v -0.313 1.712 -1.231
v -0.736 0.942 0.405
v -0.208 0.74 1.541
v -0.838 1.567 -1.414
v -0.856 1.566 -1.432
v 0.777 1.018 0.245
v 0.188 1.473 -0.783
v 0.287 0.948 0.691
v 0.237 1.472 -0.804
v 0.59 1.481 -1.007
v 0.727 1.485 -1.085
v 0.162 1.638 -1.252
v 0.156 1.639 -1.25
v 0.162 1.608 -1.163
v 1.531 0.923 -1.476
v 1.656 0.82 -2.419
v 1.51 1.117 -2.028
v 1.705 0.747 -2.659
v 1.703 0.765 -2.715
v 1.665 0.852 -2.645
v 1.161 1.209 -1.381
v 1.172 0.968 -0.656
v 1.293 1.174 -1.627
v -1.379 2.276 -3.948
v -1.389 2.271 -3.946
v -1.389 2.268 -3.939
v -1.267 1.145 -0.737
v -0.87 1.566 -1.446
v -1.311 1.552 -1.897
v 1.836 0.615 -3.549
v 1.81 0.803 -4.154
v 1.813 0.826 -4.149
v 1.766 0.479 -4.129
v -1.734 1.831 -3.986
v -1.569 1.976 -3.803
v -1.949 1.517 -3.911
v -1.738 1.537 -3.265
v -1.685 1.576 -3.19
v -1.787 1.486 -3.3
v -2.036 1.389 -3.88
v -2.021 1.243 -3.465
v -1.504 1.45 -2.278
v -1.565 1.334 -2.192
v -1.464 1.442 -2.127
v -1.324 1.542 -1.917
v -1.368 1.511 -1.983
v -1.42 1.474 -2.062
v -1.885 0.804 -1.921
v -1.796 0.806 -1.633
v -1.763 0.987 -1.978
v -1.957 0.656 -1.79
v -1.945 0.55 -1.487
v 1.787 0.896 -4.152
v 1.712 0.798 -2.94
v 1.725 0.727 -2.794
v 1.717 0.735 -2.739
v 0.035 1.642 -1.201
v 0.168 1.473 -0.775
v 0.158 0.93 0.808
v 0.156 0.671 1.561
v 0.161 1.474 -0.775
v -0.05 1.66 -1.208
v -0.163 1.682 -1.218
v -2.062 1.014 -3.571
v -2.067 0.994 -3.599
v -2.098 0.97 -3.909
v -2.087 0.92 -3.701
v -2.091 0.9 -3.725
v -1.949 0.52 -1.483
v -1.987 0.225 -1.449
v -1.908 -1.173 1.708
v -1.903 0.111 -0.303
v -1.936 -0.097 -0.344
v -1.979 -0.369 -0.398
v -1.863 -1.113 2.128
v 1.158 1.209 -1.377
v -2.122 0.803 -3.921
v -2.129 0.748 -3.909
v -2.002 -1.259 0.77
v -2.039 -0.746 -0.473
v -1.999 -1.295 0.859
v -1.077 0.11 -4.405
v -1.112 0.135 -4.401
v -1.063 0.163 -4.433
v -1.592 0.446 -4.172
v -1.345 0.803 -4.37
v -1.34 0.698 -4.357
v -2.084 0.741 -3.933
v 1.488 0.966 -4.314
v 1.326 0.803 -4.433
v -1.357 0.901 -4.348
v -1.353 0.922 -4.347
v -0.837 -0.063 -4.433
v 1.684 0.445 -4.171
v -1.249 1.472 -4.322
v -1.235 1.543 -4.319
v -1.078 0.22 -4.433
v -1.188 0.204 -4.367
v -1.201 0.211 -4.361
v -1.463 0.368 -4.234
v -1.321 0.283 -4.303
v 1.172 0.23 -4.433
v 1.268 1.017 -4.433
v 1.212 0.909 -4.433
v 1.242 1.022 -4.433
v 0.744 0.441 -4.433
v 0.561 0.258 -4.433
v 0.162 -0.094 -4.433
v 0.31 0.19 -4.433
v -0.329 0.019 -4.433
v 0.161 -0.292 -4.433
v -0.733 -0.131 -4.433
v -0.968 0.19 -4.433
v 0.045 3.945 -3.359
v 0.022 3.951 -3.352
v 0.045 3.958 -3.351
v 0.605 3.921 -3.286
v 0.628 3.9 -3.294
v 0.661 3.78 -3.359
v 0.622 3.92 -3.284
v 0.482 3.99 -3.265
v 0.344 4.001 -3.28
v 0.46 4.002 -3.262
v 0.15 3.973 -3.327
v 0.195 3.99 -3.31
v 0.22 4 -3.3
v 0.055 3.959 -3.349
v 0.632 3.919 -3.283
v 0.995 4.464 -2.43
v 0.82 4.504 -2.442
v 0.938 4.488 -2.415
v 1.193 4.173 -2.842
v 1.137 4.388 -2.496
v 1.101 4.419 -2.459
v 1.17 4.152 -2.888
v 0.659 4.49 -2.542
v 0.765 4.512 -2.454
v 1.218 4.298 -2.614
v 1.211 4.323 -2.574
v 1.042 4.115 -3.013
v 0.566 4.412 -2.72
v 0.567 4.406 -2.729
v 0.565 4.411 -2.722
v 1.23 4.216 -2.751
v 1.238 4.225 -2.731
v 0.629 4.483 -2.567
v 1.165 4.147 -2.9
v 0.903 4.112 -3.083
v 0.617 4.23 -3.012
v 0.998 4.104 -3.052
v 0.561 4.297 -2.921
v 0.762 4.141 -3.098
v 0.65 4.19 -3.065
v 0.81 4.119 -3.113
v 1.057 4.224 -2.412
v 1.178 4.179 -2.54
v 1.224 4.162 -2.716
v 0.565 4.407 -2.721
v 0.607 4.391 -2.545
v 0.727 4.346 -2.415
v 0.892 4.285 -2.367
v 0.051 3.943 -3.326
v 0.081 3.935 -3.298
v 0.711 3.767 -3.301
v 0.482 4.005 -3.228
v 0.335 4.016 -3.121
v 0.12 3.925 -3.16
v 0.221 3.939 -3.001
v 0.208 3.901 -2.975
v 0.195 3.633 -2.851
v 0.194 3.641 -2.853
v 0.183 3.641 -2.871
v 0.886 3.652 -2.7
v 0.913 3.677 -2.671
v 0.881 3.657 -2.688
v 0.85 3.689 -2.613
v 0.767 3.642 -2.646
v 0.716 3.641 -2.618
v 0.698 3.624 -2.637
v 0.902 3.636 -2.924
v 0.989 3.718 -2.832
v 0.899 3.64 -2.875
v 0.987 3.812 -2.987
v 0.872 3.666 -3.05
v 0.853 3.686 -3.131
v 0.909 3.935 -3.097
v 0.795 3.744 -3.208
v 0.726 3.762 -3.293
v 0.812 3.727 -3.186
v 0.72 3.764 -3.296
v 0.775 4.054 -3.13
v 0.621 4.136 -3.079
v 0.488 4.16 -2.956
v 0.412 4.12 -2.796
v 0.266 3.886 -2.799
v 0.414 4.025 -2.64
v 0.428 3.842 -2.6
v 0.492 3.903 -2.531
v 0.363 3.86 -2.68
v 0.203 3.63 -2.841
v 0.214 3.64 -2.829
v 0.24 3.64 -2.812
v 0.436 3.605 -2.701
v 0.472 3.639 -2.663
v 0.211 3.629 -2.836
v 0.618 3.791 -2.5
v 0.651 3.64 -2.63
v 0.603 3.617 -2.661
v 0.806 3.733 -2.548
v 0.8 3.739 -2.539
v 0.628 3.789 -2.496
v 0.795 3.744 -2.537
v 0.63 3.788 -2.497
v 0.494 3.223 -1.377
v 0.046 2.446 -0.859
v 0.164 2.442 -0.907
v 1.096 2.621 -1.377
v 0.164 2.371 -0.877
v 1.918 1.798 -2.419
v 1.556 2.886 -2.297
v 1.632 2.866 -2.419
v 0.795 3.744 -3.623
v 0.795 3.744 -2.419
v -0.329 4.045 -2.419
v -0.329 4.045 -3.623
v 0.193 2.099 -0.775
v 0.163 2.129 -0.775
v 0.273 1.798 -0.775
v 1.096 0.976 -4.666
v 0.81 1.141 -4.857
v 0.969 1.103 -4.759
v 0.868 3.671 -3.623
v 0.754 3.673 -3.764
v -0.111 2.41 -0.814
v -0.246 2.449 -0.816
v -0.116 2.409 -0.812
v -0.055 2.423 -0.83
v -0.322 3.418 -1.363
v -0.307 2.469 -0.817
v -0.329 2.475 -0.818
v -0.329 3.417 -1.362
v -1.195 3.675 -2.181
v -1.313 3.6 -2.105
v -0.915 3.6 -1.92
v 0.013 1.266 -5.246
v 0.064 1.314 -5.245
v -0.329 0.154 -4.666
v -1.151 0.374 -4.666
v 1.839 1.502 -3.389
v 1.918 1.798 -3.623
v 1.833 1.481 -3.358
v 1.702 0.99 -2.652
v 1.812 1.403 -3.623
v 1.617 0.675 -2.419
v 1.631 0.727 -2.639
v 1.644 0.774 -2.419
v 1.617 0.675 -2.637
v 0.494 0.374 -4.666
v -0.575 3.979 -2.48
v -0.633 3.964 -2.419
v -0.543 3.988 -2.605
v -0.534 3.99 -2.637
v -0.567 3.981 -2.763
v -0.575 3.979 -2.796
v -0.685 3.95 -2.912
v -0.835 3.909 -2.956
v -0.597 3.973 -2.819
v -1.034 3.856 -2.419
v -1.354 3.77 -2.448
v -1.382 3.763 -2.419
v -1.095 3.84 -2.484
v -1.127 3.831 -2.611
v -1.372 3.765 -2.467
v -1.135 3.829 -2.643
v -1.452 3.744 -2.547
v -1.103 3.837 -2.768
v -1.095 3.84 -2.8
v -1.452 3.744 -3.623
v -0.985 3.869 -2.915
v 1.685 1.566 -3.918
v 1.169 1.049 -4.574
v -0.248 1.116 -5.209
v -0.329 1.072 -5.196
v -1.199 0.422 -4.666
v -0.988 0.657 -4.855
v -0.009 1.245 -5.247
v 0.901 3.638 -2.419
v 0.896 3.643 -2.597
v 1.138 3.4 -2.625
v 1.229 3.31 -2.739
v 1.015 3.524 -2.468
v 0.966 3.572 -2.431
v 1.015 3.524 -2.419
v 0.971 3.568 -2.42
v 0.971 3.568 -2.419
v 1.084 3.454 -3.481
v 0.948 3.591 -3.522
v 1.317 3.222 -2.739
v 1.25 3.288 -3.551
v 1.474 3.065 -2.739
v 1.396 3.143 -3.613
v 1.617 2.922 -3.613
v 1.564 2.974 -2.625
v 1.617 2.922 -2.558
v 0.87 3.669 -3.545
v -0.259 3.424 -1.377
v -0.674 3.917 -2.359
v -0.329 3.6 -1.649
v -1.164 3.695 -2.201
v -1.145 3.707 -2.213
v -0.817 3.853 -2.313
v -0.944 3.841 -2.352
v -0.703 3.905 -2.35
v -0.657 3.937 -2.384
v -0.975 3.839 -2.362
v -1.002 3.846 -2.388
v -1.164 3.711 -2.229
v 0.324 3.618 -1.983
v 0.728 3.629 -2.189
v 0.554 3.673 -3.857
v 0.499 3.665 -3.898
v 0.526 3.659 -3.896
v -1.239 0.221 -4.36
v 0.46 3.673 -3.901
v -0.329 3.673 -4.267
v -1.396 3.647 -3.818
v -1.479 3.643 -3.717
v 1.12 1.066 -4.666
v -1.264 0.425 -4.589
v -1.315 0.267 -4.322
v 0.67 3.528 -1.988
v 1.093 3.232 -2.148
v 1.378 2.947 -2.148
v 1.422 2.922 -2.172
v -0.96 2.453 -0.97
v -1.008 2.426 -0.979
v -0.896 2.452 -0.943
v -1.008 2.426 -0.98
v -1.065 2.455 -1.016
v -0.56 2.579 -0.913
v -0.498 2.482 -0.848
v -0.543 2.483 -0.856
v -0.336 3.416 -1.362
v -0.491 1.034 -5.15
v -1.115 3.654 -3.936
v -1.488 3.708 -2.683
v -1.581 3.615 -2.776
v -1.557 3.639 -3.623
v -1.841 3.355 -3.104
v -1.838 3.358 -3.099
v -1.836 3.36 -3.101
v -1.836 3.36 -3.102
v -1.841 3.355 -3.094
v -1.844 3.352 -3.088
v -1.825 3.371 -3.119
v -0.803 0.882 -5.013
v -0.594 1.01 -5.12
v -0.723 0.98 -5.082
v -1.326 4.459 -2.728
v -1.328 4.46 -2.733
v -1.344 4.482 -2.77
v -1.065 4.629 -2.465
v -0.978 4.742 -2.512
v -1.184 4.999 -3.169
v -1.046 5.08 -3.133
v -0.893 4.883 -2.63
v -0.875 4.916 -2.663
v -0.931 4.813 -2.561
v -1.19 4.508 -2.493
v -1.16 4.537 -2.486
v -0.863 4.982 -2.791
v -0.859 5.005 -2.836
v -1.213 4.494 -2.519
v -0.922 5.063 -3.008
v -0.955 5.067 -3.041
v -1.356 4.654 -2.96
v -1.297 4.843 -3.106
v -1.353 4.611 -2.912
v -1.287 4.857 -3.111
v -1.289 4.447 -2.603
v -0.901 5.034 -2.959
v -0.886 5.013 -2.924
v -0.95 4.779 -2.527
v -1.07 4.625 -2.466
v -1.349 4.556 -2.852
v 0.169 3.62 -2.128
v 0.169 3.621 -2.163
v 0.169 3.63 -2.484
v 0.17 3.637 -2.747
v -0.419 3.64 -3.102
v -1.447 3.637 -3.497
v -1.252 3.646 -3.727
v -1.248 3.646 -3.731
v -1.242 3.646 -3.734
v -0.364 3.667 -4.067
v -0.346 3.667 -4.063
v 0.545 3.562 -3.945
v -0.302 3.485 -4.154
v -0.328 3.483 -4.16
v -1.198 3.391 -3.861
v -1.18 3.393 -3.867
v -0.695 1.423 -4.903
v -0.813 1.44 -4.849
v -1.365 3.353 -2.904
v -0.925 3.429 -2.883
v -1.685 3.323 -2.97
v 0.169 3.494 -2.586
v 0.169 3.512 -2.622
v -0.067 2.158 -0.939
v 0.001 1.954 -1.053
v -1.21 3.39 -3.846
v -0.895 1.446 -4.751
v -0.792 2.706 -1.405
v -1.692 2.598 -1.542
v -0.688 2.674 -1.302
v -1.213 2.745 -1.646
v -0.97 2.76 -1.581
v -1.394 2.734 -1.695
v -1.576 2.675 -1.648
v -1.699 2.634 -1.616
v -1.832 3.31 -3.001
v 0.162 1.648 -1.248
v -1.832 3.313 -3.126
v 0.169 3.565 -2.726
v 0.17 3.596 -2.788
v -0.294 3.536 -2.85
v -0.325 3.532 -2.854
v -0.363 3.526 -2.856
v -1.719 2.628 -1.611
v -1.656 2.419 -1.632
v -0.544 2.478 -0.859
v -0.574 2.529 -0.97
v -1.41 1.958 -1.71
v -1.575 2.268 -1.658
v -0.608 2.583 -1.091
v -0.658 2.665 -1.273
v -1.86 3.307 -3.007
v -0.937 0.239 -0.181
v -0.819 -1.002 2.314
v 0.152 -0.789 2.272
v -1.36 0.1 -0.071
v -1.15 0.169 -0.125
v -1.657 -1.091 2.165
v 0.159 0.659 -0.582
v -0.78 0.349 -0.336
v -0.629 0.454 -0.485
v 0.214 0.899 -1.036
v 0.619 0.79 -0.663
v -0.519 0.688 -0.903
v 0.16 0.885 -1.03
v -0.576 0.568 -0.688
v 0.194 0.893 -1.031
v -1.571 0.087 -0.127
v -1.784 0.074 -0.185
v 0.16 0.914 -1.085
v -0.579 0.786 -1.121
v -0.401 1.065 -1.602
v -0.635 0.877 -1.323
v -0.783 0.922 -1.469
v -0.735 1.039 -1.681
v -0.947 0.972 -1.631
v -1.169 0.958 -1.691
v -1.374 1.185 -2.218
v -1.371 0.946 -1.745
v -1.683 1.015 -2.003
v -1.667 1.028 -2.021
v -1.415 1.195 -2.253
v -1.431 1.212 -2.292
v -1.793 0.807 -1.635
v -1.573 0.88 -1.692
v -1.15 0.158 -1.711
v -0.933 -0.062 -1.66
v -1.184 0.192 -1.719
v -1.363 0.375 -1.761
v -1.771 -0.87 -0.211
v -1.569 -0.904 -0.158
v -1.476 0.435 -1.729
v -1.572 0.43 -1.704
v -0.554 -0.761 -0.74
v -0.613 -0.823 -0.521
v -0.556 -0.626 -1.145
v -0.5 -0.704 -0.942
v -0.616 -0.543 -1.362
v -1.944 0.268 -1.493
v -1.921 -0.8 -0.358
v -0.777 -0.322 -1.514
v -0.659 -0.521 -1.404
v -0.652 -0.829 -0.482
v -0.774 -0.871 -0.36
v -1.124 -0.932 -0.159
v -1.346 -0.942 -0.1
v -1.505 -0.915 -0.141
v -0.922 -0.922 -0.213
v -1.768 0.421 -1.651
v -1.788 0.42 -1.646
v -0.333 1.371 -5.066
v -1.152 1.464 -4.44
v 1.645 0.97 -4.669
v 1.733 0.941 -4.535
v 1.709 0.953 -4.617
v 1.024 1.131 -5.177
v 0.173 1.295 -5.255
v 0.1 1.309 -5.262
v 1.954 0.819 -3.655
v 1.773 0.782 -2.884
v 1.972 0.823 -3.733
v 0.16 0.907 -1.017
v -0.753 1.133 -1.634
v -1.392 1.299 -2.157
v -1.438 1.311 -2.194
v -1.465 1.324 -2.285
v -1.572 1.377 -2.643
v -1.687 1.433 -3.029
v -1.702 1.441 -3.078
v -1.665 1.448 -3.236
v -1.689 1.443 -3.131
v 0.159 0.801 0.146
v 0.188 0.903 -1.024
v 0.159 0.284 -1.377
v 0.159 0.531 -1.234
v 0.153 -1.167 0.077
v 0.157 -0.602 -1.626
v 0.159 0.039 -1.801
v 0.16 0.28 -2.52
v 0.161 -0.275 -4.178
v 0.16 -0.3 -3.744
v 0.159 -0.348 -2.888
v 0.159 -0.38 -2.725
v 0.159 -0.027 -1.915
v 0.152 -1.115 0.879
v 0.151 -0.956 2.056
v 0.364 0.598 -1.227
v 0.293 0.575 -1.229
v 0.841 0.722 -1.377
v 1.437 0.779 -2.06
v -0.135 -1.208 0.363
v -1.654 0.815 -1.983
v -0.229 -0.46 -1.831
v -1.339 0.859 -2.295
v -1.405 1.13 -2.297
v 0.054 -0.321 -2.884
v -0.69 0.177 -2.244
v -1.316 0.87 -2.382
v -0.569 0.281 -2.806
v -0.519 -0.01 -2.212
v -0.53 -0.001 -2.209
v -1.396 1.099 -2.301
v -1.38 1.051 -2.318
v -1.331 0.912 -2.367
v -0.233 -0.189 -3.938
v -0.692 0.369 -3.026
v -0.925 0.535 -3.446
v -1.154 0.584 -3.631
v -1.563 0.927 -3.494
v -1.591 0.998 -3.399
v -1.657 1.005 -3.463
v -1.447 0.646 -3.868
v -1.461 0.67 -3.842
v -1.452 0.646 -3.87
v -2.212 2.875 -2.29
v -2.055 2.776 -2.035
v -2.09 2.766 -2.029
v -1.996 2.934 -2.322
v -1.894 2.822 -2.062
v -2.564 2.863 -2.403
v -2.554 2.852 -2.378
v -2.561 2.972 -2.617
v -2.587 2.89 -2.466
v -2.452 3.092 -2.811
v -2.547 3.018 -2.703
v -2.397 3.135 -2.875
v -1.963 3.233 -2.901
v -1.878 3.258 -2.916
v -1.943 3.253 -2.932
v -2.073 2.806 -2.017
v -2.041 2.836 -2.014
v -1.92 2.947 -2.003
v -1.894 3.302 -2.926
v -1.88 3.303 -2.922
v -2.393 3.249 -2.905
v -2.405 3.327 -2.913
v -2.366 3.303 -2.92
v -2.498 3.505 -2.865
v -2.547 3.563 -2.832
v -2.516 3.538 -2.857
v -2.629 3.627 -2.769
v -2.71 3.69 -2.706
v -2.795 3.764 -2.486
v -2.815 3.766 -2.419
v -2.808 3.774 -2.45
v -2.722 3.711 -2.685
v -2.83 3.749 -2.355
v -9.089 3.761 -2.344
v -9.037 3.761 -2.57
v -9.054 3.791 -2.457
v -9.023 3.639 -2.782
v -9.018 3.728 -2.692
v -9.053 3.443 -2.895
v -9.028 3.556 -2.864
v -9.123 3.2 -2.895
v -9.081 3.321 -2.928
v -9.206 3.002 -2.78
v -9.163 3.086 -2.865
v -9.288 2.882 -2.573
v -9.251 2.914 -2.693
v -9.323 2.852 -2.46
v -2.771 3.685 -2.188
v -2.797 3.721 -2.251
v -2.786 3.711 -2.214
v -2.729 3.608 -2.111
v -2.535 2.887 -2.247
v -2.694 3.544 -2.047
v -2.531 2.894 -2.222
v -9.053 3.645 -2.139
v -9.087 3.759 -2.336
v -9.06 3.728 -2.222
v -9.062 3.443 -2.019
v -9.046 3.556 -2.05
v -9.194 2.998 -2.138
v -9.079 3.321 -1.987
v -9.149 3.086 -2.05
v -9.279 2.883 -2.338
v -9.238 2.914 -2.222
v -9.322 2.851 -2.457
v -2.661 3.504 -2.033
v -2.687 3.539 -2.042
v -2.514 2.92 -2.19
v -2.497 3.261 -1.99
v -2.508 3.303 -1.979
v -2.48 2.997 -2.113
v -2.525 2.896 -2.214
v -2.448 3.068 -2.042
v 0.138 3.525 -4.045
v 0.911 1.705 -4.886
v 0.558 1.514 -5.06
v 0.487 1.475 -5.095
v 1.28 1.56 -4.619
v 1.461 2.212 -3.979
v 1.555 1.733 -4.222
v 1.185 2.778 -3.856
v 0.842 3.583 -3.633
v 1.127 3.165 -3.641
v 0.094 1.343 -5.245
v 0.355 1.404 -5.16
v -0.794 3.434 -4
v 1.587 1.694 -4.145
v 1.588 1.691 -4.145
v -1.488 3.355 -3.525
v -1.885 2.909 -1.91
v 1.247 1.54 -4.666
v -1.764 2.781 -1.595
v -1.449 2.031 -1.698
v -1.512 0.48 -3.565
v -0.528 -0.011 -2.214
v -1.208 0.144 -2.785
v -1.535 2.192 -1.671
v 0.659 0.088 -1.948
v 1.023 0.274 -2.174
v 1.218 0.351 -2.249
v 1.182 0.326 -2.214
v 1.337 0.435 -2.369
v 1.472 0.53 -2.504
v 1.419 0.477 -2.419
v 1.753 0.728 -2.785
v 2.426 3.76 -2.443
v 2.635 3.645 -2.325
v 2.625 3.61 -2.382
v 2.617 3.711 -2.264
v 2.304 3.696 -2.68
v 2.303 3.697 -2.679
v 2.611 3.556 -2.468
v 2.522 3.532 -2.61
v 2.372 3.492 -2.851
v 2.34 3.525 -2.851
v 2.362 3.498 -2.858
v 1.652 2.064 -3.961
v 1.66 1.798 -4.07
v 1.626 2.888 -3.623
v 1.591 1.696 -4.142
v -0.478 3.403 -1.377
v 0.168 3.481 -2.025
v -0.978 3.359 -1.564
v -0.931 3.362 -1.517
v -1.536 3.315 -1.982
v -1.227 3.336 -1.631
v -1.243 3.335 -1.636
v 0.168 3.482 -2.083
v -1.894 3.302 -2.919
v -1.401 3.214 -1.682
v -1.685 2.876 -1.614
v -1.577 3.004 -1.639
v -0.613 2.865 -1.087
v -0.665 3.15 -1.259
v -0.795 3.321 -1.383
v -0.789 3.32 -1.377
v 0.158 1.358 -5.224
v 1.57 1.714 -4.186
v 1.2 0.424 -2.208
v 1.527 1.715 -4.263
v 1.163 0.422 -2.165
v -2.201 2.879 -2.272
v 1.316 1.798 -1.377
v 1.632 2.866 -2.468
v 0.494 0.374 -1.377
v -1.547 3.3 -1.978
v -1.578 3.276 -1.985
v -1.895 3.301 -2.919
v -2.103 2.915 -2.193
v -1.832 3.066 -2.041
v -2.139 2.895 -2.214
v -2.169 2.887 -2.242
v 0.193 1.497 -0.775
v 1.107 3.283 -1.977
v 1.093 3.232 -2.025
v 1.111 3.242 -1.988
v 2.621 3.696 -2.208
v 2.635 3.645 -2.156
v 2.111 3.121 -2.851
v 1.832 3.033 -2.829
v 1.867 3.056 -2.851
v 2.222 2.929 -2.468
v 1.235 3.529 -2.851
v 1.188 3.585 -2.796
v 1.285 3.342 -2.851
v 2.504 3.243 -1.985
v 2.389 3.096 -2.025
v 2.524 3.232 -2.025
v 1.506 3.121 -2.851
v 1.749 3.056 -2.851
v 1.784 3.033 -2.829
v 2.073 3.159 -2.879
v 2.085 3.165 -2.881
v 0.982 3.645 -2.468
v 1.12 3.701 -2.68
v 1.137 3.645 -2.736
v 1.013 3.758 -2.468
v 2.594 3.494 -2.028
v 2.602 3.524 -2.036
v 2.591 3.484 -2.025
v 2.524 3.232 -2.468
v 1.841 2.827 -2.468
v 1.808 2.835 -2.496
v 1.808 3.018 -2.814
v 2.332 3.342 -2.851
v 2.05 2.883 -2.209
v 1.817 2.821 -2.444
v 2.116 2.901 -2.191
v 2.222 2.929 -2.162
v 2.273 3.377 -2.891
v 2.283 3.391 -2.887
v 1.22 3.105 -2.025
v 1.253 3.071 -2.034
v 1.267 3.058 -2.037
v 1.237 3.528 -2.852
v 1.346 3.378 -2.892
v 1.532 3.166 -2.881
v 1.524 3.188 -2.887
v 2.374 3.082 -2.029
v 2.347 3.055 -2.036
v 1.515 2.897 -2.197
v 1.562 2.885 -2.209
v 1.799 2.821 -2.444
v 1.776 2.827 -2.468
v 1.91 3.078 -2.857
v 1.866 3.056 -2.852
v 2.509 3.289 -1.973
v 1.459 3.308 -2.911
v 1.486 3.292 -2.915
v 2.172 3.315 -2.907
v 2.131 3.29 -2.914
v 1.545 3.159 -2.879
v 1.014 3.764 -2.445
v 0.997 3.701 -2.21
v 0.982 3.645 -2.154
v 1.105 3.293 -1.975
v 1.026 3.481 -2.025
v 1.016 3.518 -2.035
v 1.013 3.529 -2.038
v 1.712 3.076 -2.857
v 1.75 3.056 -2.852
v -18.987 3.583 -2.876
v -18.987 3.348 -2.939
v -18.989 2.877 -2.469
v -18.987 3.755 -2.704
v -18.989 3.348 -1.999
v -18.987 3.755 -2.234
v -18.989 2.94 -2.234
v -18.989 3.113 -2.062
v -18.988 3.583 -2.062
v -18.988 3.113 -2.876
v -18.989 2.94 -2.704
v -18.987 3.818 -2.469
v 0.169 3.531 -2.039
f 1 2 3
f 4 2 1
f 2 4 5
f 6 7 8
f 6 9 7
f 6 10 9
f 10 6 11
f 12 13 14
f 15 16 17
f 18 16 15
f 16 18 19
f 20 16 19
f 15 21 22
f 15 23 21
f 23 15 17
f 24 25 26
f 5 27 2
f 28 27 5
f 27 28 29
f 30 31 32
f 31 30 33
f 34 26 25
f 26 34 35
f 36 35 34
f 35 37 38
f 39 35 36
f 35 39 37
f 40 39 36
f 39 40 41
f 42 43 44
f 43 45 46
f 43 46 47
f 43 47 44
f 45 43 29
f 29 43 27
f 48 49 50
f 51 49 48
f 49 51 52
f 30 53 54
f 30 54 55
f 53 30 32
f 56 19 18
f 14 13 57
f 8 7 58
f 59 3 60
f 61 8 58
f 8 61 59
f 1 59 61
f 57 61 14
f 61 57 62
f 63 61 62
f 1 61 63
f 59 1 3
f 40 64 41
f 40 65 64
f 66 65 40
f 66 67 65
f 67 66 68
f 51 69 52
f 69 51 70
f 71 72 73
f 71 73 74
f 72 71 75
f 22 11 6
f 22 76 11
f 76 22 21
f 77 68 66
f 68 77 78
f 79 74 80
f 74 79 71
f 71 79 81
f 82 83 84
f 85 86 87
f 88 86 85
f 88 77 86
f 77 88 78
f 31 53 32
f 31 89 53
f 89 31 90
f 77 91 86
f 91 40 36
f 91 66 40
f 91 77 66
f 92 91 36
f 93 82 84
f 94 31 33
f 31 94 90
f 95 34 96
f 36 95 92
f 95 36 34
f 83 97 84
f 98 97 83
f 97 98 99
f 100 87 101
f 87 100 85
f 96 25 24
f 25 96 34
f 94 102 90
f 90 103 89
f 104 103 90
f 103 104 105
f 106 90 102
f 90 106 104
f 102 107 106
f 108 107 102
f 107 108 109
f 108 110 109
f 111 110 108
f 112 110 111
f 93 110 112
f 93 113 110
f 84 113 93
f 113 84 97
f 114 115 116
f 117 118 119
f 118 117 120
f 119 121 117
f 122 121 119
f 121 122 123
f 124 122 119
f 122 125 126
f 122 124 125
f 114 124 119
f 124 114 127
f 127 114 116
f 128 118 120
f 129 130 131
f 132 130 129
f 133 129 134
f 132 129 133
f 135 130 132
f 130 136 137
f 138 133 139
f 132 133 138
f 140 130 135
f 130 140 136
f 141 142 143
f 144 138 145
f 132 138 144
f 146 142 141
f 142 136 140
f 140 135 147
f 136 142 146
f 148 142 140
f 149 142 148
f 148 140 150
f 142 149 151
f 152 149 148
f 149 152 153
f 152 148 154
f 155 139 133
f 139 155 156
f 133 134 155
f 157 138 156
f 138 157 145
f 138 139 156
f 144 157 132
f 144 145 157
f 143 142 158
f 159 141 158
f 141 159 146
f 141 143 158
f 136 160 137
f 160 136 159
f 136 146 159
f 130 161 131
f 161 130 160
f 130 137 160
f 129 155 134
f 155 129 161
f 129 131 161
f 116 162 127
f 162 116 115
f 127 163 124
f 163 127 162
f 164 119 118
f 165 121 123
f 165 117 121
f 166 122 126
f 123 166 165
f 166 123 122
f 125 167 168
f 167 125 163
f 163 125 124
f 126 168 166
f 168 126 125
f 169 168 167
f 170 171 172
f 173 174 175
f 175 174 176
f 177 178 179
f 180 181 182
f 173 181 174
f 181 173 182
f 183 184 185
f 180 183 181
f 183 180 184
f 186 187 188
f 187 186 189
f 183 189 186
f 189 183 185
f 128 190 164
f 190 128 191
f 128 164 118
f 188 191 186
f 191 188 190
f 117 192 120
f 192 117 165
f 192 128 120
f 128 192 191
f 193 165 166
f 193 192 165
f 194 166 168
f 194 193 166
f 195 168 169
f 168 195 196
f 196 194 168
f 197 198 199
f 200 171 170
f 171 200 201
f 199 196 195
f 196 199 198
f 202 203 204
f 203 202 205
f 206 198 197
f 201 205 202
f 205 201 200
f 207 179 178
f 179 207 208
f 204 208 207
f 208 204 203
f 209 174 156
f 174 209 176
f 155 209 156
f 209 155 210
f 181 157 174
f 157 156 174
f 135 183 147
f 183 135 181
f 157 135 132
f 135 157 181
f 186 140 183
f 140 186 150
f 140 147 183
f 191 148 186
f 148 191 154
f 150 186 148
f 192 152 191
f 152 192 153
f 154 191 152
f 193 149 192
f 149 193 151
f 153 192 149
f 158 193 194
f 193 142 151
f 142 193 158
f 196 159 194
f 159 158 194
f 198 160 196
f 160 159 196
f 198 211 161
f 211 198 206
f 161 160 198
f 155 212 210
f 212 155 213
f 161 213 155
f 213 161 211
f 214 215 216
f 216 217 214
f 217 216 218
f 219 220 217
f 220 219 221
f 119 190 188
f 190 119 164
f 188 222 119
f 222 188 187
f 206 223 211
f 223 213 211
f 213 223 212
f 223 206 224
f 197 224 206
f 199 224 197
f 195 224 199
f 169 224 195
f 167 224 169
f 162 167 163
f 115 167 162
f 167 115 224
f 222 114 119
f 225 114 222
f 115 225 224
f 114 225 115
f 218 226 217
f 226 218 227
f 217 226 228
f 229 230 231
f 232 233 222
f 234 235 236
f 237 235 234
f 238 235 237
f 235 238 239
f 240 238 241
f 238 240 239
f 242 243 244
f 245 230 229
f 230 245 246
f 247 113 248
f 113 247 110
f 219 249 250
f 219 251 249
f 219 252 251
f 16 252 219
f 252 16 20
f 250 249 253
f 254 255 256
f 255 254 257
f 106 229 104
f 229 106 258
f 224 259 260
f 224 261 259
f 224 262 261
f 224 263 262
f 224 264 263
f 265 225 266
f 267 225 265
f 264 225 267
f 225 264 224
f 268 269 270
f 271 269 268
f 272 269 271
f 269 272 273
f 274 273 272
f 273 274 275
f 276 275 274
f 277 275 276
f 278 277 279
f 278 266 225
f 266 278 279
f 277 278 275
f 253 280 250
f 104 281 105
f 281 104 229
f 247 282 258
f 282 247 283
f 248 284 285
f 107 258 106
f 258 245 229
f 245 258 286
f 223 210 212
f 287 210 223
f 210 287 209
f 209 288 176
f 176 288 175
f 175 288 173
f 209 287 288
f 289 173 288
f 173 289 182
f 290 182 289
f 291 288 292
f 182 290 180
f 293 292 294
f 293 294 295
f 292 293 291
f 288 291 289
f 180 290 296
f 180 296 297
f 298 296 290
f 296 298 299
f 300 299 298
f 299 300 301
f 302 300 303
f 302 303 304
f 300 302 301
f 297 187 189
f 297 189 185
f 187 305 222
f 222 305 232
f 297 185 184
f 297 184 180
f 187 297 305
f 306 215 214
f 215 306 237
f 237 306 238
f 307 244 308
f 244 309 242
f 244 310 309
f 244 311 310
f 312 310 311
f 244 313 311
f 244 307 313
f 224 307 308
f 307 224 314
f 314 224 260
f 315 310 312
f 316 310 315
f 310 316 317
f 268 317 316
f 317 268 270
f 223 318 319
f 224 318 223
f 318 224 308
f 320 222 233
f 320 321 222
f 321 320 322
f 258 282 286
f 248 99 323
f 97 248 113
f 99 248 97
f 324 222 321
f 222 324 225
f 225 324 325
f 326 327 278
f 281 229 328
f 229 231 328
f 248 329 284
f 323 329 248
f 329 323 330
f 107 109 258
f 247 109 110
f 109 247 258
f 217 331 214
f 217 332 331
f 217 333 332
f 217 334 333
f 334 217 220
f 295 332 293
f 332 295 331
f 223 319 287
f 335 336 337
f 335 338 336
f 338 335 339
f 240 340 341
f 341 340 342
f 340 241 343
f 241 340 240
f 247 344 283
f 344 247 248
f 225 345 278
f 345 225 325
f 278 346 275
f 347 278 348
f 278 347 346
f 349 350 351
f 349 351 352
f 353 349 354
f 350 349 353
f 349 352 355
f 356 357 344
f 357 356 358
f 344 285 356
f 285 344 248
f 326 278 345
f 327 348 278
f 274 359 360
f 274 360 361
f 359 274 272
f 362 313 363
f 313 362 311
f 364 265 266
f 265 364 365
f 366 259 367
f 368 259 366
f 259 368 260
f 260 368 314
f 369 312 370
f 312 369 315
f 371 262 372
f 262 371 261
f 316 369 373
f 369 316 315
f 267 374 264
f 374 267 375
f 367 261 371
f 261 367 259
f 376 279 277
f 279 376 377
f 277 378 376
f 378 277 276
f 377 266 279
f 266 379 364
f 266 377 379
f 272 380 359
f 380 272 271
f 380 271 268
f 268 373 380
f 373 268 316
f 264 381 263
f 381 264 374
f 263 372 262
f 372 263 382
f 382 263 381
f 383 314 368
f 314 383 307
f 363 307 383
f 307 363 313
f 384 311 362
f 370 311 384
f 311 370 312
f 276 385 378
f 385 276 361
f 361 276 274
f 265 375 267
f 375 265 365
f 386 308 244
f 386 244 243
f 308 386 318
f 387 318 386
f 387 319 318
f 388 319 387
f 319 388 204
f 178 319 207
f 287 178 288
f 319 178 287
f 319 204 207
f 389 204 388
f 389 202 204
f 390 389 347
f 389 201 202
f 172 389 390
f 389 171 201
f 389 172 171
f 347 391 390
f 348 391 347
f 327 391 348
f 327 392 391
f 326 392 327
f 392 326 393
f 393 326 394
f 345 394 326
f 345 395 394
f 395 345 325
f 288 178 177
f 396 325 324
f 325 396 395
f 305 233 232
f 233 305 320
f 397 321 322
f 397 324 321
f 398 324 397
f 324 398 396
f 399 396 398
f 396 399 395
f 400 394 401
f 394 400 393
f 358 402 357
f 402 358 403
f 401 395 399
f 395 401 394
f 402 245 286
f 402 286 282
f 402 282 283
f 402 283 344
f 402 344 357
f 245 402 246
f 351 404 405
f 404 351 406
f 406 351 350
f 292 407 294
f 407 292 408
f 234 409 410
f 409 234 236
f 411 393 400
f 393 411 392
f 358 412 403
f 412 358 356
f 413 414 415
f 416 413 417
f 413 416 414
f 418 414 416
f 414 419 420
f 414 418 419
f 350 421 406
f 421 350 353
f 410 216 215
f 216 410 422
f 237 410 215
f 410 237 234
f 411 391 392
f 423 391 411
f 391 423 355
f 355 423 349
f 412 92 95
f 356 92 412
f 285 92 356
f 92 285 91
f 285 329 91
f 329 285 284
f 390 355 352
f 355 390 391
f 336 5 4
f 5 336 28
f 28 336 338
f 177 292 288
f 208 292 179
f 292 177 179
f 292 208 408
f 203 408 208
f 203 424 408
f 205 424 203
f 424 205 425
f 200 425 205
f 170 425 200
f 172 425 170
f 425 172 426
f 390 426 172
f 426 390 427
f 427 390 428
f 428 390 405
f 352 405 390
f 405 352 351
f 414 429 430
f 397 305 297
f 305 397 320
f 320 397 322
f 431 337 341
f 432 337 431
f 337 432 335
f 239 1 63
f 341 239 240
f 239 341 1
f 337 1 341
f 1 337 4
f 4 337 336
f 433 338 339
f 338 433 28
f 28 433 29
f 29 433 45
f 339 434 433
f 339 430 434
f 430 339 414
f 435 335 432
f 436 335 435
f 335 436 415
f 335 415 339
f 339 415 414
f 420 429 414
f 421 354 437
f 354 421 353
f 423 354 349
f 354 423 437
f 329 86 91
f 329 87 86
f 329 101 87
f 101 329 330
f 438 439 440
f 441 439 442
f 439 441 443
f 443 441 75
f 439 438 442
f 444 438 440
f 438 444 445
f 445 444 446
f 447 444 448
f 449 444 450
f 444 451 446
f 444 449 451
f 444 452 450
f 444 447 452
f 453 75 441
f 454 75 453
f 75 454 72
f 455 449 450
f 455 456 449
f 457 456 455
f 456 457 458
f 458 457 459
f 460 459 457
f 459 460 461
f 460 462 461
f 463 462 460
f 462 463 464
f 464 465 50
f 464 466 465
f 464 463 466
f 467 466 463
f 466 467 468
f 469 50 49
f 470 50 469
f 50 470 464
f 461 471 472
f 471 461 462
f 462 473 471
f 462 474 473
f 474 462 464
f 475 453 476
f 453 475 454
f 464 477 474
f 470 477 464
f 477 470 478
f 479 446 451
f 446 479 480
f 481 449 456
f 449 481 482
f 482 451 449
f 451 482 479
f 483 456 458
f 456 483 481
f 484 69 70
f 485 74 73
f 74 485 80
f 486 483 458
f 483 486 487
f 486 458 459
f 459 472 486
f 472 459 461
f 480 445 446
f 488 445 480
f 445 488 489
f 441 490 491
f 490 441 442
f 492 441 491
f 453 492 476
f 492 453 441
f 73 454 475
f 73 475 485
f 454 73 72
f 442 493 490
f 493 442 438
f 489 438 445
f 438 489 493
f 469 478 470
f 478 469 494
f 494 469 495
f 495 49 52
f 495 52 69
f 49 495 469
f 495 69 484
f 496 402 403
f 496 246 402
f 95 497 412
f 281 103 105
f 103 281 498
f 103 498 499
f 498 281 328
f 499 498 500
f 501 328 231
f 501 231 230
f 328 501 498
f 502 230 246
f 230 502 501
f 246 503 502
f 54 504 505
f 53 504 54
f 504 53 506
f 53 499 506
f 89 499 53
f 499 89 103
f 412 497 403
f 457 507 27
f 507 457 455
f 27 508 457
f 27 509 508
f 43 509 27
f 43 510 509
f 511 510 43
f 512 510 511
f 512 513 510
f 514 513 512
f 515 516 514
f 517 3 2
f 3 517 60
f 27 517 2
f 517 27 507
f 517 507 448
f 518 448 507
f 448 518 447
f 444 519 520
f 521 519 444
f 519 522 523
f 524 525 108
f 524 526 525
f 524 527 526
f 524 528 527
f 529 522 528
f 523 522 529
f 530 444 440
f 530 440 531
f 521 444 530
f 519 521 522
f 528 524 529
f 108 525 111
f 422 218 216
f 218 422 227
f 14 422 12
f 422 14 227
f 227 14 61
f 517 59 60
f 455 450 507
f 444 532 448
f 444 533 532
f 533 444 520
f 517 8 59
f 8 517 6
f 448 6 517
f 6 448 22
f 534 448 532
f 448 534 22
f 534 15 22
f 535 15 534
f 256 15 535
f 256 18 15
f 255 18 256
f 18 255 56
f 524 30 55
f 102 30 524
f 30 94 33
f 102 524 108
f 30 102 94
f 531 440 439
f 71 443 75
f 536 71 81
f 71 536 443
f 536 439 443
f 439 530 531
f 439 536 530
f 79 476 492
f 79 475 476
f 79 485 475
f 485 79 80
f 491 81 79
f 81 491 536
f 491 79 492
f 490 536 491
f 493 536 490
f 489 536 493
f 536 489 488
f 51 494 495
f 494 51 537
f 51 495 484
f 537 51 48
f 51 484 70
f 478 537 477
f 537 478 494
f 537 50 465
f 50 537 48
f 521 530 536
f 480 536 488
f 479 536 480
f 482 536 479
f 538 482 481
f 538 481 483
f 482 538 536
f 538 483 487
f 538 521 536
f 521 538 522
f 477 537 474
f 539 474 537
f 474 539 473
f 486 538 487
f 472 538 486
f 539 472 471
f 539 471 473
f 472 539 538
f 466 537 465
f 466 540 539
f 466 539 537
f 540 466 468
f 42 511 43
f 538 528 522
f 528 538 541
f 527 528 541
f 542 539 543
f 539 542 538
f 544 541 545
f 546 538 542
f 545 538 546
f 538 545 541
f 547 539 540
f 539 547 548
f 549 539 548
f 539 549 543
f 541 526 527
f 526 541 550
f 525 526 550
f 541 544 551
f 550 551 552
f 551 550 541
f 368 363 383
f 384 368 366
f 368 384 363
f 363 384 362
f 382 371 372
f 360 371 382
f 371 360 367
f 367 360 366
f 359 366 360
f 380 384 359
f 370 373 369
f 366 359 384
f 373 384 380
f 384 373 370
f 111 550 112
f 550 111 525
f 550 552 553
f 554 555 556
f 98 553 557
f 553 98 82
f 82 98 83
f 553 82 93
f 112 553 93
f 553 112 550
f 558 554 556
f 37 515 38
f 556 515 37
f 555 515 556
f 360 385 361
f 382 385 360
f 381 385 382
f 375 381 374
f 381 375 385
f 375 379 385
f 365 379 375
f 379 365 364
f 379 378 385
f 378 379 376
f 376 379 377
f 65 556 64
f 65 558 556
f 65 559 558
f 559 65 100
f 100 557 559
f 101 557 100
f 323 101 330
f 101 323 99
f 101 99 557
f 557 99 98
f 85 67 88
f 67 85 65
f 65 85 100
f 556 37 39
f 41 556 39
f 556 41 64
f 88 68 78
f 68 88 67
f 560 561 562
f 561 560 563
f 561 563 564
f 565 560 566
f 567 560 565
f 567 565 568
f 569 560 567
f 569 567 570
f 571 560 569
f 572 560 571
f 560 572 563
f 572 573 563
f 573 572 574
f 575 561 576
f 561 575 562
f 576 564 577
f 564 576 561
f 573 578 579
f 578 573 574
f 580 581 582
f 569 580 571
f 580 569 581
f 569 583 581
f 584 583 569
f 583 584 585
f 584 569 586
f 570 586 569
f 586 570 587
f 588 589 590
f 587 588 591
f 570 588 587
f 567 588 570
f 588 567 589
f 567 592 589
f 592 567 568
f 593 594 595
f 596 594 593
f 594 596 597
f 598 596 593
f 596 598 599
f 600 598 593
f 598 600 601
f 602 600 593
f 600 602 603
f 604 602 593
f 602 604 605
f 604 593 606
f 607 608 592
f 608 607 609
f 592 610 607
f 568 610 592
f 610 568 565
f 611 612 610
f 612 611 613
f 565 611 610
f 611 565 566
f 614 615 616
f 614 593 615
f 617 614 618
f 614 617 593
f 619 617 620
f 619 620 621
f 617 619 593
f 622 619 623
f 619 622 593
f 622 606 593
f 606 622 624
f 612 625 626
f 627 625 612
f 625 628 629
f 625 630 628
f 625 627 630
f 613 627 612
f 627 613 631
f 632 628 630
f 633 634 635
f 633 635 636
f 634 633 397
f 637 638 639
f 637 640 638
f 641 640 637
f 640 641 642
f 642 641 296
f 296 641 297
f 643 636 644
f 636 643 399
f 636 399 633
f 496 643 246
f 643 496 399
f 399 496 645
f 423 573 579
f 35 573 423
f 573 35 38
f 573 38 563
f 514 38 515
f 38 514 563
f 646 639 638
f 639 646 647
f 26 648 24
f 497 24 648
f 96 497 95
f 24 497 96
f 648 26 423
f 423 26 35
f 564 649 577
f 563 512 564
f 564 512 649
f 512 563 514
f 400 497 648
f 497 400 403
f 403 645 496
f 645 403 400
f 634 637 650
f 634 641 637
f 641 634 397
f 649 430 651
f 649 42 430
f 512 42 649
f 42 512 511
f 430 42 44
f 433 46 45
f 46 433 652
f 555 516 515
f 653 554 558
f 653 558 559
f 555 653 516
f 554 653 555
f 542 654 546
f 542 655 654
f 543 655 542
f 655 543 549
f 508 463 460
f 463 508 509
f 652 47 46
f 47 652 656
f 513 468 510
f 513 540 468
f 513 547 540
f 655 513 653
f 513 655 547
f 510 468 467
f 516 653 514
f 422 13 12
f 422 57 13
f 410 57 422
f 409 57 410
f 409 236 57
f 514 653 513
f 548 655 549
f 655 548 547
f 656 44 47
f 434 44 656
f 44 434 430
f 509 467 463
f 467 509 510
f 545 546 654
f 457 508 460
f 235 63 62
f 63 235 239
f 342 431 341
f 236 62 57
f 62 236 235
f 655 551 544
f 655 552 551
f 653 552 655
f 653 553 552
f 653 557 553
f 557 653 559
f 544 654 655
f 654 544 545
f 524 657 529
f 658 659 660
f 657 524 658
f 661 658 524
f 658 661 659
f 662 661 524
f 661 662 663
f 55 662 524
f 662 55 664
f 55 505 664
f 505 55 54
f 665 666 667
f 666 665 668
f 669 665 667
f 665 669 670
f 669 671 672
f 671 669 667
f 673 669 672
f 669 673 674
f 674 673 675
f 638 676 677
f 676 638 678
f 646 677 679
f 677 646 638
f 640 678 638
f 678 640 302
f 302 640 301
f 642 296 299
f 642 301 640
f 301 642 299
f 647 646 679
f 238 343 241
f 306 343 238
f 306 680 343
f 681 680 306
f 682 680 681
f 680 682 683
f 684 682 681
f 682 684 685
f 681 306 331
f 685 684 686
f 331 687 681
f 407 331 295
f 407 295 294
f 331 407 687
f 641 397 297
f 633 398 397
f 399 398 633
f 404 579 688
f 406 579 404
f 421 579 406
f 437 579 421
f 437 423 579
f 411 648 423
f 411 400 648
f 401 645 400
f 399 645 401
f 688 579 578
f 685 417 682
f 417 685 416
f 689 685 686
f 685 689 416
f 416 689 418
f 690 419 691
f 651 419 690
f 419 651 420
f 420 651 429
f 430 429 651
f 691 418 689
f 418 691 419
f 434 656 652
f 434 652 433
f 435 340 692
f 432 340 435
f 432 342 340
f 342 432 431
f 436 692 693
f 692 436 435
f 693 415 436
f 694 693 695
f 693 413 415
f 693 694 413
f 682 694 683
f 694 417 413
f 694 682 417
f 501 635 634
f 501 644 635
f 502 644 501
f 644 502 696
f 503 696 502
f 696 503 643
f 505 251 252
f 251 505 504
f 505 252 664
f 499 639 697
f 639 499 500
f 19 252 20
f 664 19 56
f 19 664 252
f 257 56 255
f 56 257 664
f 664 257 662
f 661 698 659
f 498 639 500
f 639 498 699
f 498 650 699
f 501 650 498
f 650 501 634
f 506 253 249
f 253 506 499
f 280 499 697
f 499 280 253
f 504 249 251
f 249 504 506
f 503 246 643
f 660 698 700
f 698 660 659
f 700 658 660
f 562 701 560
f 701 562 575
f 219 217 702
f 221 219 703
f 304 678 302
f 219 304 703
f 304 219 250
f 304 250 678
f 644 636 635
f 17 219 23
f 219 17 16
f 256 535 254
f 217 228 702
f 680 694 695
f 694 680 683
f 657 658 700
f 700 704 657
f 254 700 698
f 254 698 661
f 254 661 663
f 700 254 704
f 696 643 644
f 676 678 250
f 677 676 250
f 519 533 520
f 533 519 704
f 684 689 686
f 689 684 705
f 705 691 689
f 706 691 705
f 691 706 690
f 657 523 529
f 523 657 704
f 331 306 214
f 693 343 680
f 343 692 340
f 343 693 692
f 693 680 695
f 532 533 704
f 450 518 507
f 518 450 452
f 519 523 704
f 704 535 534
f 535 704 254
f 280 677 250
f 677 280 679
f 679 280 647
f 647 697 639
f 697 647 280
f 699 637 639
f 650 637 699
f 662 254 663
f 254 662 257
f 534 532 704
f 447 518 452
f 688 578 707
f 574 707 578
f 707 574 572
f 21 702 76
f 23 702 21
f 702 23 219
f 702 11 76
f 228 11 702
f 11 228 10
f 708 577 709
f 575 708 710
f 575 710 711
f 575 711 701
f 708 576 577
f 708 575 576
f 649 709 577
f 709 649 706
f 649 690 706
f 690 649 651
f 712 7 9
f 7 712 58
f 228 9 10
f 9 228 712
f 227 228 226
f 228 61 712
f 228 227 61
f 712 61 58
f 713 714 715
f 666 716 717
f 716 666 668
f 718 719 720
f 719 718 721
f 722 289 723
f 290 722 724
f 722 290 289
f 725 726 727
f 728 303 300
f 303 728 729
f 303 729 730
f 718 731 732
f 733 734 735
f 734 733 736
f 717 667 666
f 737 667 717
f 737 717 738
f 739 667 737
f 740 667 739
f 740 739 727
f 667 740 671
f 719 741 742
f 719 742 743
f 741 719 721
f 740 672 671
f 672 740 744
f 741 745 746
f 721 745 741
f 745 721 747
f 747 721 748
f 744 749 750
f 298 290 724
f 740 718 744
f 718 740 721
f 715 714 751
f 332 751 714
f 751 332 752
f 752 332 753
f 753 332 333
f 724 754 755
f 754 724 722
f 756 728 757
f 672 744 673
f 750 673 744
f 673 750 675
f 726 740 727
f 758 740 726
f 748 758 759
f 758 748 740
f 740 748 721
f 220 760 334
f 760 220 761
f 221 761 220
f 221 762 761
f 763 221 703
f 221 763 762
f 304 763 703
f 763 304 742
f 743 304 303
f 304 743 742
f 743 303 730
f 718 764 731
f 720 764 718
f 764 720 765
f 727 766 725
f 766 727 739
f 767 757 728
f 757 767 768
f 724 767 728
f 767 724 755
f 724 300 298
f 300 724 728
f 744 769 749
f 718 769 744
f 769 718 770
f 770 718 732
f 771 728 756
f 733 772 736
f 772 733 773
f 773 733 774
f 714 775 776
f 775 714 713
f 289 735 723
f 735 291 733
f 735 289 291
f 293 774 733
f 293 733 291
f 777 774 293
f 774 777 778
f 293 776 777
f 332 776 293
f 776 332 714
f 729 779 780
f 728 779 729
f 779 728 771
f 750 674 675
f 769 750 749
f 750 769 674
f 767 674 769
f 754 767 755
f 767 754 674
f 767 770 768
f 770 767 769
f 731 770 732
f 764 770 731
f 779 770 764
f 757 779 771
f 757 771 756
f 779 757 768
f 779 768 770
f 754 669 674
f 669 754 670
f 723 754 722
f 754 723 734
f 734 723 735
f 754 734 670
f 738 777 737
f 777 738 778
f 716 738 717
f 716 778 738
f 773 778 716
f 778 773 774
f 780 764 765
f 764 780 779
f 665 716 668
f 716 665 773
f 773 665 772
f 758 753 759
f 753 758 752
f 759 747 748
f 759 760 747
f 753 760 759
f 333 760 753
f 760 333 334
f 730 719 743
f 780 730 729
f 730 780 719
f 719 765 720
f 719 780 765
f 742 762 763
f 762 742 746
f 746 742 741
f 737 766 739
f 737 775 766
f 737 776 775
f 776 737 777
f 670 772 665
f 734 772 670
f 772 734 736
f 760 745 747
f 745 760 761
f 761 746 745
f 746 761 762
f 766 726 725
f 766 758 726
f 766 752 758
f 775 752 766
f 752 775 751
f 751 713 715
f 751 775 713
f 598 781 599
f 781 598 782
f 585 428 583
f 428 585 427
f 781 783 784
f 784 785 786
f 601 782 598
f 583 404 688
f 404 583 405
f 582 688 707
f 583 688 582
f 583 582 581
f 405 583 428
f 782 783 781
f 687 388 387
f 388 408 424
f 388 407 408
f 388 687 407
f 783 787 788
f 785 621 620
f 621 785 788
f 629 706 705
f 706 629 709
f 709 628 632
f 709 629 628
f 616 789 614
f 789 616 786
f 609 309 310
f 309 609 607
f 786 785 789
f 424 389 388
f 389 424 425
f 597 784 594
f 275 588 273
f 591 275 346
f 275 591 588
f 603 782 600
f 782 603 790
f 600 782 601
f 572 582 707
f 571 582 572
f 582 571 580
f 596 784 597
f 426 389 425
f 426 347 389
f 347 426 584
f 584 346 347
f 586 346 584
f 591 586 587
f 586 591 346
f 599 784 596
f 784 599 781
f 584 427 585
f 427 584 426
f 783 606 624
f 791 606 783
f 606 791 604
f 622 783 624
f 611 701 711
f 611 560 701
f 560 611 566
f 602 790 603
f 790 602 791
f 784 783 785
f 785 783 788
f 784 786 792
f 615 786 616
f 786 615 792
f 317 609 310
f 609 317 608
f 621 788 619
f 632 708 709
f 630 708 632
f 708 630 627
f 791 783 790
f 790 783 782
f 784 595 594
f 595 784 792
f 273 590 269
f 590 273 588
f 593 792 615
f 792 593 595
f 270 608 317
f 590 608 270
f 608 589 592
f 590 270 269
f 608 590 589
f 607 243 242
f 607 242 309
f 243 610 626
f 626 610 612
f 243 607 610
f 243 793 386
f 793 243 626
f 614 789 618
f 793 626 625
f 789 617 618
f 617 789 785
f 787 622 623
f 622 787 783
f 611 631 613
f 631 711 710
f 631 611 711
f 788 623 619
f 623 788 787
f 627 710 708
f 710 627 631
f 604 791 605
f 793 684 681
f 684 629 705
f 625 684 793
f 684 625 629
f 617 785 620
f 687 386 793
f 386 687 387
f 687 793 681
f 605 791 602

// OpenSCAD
// Begin.
union() {
intersection() {
union() {
union() {
intersection() {
rotate([0, -70.564, -83.8064])
translate([0, -0.126678, -0.790822])
rotate([0, 90, 0])
cylinder(h = 38, r1 = 2.01835, r2 = 2.01835, center = true, $fn = 12);

translate([0.04541, 0.80336, 0.34418])
sphere(r = 4.9462, $fn = 12);
}

intersection() {
translate([0.04541, 0.80336, 0.34418])
sphere(r = 4.9462, $fn = 12);

translate([0.51496, 4.42519, -3.43138])
rotate([0, 29.5662, -20.3935])
rotate([0, 90, 0])
rotate_extrude($fn = 12)
translate([0.81987, 0, 0])
circle(r = 0.3517, $fn = 12);
}
}

intersection() {
union() {
translate([-0.32868, 1.79825, -3.02131])
sphere(r = 2.32598, $fn = 12);

rotate([0, -10.5486, -72.2556])
translate([-9.8378, 0.396296, -1.86718])
rotate([0, 90, 0])
cylinder(h = 18.3244, r1 = 0.31062, r2 = 0.31062, center = true, $fn = 12);
}

union() {
rotate([-178.398, 0, 0.750918])
translate([0, -11.2783, 0])
cube(size = [38, 15.4435, 38], center = true);

rotate([0, 26.4329, -78.8553])
translate([8.55542, 0.351596, -3.53207])
rotate([0, 90, 0])
cylinder(h = 20.8892, r1 = 1.74269, r2 = 1.74269, center = true, $fn = 12);
}
}
}

difference() {
union() {
rotate([5.17169, -0, -10.4524])
translate([0, 9.91302, 0])
cube(size = [38, 18.174, 38], center = true);

difference() {
rotate([-153.567, 0, 11.1447])
translate([0, 9.35408, 0])
cube(size = [38, 19.2918, 38], center = true);

rotate([0, 1.60165, -89.2491])
translate([0, -1.35832, -0.92254])
rotate([0, 90, 0])
cylinder(h = 38, r1 = 0.84876, r2 = 0.84876, center = true, $fn = 12);
}
}

union() {
difference() {
rotate([-0, -0.068182, -0.155845])
translate([9.57827, 0, 0])
cube(size = [18.8435, 38, 38], center = true);

rotate([169.451, 0, 17.7444])
translate([0, -9.8378, 0])
cube(size = [38, 18.3244, 38], center = true);
}

difference() {
rotate([-178.398, 0, 0.750918])
translate([0, 0, 0])
cube(size = [38, 38, 38], center = true);

translate([-2.10784, 2.61544, -2.50246])
rotate([0, 7.34194, -89.2836])
rotate([0, 90, 0])
rotate_extrude($fn = 12)
translate([3.84969, 0, 0])
circle(r = 3.45, $fn = 12);
}
}
}
}

intersection() {
union() {
union() {
difference() {
rotate([-153.567, 0, 11.1447])
translate([0, -10.4446, 0])
cube(size = [38, 17.1108, 38], center = true);

translate([-2.10784, 2.61544, -2.50246])
rotate([0, 7.34194, -89.2836])
rotate([0, 90, 0])
rotate_extrude($fn = 12)
translate([3.84969, 0, 0])
circle(r = 3.45, $fn = 12);
}

intersection() {
rotate([0, 26.4329, -78.8553])
translate([0, 0.351596, -3.53207])
rotate([0, 90, 0])
cylinder(h = 38, r1 = 1.74269, r2 = 1.74269, center = true, $fn = 12);

rotate([5.17169, -0, -10.4524])
translate([0, 9.91302, 0])
cube(size = [38, 18.174, 38], center = true);
}
}

intersection() {
union() {
rotate([0, 26.4329, -78.8553])
translate([-9.04817, 0.351596, -3.53207])
rotate([0, 90, 0])
cylinder(h = 19.9037, r1 = 1.74269, r2 = 1.74269, center = true, $fn = 12);

rotate([-0, -0.068182, -0.155845])
translate([9.57827, 0, 0])
cube(size = [18.8435, 38, 38], center = true);
}

intersection() {
rotate([-153.567, 0, 11.1447])
translate([0, -9.04817, 0])
cube(size = [38, 19.9037, 38], center = true);

translate([0.04541, 0.80336, 0.34418])
sphere(r = 4.9462, $fn = 12);
}
}
}

union() {
intersection() {
difference() {
rotate([-178.668, 0, 5.52939])
translate([0, 7.79984, 0])
cube(size = [38, 22.4003, 38], center = true);

rotate([0, 1.60165, -89.2491])
translate([0, -1.35832, -0.92254])
rotate([0, 90, 0])
cylinder(h = 38, r1 = 0.84876, r2 = 0.84876, center = true, $fn = 12);
}

union() {
rotate([0, 26.4329, -78.8553])
translate([9.35408, 0.351596, -3.53207])
rotate([0, 90, 0])
cylinder(h = 19.2918, r1 = 1.74269, r2 = 1.74269, center = true, $fn = 12);

translate([-0.32868, 1.79825, -3.02131])
sphere(r = 2.32598, $fn = 12);
}
}

union() {
intersection() {
translate([1.80842, 3.6447, -2.24635])
sphere(r = 0.85536, $fn = 12);

rotate([0, -0.068182, -0.155845])
translate([9.57827, 3.29622, -2.44634])
rotate([0, 90, 0])
cylinder(h = 18.8435, r1 = 0.47041, r2 = 0.47041, center = true, $fn = 12);
}

rotate([0, -0.068182, -0.155845])
translate([-9.42173, 3.29622, -2.44634])
rotate([0, 90, 0])
cylinder(h = 19.1565, r1 = 0.47041, r2 = 0.47041, center = true, $fn = 12);
}
}
}
}
// End.
